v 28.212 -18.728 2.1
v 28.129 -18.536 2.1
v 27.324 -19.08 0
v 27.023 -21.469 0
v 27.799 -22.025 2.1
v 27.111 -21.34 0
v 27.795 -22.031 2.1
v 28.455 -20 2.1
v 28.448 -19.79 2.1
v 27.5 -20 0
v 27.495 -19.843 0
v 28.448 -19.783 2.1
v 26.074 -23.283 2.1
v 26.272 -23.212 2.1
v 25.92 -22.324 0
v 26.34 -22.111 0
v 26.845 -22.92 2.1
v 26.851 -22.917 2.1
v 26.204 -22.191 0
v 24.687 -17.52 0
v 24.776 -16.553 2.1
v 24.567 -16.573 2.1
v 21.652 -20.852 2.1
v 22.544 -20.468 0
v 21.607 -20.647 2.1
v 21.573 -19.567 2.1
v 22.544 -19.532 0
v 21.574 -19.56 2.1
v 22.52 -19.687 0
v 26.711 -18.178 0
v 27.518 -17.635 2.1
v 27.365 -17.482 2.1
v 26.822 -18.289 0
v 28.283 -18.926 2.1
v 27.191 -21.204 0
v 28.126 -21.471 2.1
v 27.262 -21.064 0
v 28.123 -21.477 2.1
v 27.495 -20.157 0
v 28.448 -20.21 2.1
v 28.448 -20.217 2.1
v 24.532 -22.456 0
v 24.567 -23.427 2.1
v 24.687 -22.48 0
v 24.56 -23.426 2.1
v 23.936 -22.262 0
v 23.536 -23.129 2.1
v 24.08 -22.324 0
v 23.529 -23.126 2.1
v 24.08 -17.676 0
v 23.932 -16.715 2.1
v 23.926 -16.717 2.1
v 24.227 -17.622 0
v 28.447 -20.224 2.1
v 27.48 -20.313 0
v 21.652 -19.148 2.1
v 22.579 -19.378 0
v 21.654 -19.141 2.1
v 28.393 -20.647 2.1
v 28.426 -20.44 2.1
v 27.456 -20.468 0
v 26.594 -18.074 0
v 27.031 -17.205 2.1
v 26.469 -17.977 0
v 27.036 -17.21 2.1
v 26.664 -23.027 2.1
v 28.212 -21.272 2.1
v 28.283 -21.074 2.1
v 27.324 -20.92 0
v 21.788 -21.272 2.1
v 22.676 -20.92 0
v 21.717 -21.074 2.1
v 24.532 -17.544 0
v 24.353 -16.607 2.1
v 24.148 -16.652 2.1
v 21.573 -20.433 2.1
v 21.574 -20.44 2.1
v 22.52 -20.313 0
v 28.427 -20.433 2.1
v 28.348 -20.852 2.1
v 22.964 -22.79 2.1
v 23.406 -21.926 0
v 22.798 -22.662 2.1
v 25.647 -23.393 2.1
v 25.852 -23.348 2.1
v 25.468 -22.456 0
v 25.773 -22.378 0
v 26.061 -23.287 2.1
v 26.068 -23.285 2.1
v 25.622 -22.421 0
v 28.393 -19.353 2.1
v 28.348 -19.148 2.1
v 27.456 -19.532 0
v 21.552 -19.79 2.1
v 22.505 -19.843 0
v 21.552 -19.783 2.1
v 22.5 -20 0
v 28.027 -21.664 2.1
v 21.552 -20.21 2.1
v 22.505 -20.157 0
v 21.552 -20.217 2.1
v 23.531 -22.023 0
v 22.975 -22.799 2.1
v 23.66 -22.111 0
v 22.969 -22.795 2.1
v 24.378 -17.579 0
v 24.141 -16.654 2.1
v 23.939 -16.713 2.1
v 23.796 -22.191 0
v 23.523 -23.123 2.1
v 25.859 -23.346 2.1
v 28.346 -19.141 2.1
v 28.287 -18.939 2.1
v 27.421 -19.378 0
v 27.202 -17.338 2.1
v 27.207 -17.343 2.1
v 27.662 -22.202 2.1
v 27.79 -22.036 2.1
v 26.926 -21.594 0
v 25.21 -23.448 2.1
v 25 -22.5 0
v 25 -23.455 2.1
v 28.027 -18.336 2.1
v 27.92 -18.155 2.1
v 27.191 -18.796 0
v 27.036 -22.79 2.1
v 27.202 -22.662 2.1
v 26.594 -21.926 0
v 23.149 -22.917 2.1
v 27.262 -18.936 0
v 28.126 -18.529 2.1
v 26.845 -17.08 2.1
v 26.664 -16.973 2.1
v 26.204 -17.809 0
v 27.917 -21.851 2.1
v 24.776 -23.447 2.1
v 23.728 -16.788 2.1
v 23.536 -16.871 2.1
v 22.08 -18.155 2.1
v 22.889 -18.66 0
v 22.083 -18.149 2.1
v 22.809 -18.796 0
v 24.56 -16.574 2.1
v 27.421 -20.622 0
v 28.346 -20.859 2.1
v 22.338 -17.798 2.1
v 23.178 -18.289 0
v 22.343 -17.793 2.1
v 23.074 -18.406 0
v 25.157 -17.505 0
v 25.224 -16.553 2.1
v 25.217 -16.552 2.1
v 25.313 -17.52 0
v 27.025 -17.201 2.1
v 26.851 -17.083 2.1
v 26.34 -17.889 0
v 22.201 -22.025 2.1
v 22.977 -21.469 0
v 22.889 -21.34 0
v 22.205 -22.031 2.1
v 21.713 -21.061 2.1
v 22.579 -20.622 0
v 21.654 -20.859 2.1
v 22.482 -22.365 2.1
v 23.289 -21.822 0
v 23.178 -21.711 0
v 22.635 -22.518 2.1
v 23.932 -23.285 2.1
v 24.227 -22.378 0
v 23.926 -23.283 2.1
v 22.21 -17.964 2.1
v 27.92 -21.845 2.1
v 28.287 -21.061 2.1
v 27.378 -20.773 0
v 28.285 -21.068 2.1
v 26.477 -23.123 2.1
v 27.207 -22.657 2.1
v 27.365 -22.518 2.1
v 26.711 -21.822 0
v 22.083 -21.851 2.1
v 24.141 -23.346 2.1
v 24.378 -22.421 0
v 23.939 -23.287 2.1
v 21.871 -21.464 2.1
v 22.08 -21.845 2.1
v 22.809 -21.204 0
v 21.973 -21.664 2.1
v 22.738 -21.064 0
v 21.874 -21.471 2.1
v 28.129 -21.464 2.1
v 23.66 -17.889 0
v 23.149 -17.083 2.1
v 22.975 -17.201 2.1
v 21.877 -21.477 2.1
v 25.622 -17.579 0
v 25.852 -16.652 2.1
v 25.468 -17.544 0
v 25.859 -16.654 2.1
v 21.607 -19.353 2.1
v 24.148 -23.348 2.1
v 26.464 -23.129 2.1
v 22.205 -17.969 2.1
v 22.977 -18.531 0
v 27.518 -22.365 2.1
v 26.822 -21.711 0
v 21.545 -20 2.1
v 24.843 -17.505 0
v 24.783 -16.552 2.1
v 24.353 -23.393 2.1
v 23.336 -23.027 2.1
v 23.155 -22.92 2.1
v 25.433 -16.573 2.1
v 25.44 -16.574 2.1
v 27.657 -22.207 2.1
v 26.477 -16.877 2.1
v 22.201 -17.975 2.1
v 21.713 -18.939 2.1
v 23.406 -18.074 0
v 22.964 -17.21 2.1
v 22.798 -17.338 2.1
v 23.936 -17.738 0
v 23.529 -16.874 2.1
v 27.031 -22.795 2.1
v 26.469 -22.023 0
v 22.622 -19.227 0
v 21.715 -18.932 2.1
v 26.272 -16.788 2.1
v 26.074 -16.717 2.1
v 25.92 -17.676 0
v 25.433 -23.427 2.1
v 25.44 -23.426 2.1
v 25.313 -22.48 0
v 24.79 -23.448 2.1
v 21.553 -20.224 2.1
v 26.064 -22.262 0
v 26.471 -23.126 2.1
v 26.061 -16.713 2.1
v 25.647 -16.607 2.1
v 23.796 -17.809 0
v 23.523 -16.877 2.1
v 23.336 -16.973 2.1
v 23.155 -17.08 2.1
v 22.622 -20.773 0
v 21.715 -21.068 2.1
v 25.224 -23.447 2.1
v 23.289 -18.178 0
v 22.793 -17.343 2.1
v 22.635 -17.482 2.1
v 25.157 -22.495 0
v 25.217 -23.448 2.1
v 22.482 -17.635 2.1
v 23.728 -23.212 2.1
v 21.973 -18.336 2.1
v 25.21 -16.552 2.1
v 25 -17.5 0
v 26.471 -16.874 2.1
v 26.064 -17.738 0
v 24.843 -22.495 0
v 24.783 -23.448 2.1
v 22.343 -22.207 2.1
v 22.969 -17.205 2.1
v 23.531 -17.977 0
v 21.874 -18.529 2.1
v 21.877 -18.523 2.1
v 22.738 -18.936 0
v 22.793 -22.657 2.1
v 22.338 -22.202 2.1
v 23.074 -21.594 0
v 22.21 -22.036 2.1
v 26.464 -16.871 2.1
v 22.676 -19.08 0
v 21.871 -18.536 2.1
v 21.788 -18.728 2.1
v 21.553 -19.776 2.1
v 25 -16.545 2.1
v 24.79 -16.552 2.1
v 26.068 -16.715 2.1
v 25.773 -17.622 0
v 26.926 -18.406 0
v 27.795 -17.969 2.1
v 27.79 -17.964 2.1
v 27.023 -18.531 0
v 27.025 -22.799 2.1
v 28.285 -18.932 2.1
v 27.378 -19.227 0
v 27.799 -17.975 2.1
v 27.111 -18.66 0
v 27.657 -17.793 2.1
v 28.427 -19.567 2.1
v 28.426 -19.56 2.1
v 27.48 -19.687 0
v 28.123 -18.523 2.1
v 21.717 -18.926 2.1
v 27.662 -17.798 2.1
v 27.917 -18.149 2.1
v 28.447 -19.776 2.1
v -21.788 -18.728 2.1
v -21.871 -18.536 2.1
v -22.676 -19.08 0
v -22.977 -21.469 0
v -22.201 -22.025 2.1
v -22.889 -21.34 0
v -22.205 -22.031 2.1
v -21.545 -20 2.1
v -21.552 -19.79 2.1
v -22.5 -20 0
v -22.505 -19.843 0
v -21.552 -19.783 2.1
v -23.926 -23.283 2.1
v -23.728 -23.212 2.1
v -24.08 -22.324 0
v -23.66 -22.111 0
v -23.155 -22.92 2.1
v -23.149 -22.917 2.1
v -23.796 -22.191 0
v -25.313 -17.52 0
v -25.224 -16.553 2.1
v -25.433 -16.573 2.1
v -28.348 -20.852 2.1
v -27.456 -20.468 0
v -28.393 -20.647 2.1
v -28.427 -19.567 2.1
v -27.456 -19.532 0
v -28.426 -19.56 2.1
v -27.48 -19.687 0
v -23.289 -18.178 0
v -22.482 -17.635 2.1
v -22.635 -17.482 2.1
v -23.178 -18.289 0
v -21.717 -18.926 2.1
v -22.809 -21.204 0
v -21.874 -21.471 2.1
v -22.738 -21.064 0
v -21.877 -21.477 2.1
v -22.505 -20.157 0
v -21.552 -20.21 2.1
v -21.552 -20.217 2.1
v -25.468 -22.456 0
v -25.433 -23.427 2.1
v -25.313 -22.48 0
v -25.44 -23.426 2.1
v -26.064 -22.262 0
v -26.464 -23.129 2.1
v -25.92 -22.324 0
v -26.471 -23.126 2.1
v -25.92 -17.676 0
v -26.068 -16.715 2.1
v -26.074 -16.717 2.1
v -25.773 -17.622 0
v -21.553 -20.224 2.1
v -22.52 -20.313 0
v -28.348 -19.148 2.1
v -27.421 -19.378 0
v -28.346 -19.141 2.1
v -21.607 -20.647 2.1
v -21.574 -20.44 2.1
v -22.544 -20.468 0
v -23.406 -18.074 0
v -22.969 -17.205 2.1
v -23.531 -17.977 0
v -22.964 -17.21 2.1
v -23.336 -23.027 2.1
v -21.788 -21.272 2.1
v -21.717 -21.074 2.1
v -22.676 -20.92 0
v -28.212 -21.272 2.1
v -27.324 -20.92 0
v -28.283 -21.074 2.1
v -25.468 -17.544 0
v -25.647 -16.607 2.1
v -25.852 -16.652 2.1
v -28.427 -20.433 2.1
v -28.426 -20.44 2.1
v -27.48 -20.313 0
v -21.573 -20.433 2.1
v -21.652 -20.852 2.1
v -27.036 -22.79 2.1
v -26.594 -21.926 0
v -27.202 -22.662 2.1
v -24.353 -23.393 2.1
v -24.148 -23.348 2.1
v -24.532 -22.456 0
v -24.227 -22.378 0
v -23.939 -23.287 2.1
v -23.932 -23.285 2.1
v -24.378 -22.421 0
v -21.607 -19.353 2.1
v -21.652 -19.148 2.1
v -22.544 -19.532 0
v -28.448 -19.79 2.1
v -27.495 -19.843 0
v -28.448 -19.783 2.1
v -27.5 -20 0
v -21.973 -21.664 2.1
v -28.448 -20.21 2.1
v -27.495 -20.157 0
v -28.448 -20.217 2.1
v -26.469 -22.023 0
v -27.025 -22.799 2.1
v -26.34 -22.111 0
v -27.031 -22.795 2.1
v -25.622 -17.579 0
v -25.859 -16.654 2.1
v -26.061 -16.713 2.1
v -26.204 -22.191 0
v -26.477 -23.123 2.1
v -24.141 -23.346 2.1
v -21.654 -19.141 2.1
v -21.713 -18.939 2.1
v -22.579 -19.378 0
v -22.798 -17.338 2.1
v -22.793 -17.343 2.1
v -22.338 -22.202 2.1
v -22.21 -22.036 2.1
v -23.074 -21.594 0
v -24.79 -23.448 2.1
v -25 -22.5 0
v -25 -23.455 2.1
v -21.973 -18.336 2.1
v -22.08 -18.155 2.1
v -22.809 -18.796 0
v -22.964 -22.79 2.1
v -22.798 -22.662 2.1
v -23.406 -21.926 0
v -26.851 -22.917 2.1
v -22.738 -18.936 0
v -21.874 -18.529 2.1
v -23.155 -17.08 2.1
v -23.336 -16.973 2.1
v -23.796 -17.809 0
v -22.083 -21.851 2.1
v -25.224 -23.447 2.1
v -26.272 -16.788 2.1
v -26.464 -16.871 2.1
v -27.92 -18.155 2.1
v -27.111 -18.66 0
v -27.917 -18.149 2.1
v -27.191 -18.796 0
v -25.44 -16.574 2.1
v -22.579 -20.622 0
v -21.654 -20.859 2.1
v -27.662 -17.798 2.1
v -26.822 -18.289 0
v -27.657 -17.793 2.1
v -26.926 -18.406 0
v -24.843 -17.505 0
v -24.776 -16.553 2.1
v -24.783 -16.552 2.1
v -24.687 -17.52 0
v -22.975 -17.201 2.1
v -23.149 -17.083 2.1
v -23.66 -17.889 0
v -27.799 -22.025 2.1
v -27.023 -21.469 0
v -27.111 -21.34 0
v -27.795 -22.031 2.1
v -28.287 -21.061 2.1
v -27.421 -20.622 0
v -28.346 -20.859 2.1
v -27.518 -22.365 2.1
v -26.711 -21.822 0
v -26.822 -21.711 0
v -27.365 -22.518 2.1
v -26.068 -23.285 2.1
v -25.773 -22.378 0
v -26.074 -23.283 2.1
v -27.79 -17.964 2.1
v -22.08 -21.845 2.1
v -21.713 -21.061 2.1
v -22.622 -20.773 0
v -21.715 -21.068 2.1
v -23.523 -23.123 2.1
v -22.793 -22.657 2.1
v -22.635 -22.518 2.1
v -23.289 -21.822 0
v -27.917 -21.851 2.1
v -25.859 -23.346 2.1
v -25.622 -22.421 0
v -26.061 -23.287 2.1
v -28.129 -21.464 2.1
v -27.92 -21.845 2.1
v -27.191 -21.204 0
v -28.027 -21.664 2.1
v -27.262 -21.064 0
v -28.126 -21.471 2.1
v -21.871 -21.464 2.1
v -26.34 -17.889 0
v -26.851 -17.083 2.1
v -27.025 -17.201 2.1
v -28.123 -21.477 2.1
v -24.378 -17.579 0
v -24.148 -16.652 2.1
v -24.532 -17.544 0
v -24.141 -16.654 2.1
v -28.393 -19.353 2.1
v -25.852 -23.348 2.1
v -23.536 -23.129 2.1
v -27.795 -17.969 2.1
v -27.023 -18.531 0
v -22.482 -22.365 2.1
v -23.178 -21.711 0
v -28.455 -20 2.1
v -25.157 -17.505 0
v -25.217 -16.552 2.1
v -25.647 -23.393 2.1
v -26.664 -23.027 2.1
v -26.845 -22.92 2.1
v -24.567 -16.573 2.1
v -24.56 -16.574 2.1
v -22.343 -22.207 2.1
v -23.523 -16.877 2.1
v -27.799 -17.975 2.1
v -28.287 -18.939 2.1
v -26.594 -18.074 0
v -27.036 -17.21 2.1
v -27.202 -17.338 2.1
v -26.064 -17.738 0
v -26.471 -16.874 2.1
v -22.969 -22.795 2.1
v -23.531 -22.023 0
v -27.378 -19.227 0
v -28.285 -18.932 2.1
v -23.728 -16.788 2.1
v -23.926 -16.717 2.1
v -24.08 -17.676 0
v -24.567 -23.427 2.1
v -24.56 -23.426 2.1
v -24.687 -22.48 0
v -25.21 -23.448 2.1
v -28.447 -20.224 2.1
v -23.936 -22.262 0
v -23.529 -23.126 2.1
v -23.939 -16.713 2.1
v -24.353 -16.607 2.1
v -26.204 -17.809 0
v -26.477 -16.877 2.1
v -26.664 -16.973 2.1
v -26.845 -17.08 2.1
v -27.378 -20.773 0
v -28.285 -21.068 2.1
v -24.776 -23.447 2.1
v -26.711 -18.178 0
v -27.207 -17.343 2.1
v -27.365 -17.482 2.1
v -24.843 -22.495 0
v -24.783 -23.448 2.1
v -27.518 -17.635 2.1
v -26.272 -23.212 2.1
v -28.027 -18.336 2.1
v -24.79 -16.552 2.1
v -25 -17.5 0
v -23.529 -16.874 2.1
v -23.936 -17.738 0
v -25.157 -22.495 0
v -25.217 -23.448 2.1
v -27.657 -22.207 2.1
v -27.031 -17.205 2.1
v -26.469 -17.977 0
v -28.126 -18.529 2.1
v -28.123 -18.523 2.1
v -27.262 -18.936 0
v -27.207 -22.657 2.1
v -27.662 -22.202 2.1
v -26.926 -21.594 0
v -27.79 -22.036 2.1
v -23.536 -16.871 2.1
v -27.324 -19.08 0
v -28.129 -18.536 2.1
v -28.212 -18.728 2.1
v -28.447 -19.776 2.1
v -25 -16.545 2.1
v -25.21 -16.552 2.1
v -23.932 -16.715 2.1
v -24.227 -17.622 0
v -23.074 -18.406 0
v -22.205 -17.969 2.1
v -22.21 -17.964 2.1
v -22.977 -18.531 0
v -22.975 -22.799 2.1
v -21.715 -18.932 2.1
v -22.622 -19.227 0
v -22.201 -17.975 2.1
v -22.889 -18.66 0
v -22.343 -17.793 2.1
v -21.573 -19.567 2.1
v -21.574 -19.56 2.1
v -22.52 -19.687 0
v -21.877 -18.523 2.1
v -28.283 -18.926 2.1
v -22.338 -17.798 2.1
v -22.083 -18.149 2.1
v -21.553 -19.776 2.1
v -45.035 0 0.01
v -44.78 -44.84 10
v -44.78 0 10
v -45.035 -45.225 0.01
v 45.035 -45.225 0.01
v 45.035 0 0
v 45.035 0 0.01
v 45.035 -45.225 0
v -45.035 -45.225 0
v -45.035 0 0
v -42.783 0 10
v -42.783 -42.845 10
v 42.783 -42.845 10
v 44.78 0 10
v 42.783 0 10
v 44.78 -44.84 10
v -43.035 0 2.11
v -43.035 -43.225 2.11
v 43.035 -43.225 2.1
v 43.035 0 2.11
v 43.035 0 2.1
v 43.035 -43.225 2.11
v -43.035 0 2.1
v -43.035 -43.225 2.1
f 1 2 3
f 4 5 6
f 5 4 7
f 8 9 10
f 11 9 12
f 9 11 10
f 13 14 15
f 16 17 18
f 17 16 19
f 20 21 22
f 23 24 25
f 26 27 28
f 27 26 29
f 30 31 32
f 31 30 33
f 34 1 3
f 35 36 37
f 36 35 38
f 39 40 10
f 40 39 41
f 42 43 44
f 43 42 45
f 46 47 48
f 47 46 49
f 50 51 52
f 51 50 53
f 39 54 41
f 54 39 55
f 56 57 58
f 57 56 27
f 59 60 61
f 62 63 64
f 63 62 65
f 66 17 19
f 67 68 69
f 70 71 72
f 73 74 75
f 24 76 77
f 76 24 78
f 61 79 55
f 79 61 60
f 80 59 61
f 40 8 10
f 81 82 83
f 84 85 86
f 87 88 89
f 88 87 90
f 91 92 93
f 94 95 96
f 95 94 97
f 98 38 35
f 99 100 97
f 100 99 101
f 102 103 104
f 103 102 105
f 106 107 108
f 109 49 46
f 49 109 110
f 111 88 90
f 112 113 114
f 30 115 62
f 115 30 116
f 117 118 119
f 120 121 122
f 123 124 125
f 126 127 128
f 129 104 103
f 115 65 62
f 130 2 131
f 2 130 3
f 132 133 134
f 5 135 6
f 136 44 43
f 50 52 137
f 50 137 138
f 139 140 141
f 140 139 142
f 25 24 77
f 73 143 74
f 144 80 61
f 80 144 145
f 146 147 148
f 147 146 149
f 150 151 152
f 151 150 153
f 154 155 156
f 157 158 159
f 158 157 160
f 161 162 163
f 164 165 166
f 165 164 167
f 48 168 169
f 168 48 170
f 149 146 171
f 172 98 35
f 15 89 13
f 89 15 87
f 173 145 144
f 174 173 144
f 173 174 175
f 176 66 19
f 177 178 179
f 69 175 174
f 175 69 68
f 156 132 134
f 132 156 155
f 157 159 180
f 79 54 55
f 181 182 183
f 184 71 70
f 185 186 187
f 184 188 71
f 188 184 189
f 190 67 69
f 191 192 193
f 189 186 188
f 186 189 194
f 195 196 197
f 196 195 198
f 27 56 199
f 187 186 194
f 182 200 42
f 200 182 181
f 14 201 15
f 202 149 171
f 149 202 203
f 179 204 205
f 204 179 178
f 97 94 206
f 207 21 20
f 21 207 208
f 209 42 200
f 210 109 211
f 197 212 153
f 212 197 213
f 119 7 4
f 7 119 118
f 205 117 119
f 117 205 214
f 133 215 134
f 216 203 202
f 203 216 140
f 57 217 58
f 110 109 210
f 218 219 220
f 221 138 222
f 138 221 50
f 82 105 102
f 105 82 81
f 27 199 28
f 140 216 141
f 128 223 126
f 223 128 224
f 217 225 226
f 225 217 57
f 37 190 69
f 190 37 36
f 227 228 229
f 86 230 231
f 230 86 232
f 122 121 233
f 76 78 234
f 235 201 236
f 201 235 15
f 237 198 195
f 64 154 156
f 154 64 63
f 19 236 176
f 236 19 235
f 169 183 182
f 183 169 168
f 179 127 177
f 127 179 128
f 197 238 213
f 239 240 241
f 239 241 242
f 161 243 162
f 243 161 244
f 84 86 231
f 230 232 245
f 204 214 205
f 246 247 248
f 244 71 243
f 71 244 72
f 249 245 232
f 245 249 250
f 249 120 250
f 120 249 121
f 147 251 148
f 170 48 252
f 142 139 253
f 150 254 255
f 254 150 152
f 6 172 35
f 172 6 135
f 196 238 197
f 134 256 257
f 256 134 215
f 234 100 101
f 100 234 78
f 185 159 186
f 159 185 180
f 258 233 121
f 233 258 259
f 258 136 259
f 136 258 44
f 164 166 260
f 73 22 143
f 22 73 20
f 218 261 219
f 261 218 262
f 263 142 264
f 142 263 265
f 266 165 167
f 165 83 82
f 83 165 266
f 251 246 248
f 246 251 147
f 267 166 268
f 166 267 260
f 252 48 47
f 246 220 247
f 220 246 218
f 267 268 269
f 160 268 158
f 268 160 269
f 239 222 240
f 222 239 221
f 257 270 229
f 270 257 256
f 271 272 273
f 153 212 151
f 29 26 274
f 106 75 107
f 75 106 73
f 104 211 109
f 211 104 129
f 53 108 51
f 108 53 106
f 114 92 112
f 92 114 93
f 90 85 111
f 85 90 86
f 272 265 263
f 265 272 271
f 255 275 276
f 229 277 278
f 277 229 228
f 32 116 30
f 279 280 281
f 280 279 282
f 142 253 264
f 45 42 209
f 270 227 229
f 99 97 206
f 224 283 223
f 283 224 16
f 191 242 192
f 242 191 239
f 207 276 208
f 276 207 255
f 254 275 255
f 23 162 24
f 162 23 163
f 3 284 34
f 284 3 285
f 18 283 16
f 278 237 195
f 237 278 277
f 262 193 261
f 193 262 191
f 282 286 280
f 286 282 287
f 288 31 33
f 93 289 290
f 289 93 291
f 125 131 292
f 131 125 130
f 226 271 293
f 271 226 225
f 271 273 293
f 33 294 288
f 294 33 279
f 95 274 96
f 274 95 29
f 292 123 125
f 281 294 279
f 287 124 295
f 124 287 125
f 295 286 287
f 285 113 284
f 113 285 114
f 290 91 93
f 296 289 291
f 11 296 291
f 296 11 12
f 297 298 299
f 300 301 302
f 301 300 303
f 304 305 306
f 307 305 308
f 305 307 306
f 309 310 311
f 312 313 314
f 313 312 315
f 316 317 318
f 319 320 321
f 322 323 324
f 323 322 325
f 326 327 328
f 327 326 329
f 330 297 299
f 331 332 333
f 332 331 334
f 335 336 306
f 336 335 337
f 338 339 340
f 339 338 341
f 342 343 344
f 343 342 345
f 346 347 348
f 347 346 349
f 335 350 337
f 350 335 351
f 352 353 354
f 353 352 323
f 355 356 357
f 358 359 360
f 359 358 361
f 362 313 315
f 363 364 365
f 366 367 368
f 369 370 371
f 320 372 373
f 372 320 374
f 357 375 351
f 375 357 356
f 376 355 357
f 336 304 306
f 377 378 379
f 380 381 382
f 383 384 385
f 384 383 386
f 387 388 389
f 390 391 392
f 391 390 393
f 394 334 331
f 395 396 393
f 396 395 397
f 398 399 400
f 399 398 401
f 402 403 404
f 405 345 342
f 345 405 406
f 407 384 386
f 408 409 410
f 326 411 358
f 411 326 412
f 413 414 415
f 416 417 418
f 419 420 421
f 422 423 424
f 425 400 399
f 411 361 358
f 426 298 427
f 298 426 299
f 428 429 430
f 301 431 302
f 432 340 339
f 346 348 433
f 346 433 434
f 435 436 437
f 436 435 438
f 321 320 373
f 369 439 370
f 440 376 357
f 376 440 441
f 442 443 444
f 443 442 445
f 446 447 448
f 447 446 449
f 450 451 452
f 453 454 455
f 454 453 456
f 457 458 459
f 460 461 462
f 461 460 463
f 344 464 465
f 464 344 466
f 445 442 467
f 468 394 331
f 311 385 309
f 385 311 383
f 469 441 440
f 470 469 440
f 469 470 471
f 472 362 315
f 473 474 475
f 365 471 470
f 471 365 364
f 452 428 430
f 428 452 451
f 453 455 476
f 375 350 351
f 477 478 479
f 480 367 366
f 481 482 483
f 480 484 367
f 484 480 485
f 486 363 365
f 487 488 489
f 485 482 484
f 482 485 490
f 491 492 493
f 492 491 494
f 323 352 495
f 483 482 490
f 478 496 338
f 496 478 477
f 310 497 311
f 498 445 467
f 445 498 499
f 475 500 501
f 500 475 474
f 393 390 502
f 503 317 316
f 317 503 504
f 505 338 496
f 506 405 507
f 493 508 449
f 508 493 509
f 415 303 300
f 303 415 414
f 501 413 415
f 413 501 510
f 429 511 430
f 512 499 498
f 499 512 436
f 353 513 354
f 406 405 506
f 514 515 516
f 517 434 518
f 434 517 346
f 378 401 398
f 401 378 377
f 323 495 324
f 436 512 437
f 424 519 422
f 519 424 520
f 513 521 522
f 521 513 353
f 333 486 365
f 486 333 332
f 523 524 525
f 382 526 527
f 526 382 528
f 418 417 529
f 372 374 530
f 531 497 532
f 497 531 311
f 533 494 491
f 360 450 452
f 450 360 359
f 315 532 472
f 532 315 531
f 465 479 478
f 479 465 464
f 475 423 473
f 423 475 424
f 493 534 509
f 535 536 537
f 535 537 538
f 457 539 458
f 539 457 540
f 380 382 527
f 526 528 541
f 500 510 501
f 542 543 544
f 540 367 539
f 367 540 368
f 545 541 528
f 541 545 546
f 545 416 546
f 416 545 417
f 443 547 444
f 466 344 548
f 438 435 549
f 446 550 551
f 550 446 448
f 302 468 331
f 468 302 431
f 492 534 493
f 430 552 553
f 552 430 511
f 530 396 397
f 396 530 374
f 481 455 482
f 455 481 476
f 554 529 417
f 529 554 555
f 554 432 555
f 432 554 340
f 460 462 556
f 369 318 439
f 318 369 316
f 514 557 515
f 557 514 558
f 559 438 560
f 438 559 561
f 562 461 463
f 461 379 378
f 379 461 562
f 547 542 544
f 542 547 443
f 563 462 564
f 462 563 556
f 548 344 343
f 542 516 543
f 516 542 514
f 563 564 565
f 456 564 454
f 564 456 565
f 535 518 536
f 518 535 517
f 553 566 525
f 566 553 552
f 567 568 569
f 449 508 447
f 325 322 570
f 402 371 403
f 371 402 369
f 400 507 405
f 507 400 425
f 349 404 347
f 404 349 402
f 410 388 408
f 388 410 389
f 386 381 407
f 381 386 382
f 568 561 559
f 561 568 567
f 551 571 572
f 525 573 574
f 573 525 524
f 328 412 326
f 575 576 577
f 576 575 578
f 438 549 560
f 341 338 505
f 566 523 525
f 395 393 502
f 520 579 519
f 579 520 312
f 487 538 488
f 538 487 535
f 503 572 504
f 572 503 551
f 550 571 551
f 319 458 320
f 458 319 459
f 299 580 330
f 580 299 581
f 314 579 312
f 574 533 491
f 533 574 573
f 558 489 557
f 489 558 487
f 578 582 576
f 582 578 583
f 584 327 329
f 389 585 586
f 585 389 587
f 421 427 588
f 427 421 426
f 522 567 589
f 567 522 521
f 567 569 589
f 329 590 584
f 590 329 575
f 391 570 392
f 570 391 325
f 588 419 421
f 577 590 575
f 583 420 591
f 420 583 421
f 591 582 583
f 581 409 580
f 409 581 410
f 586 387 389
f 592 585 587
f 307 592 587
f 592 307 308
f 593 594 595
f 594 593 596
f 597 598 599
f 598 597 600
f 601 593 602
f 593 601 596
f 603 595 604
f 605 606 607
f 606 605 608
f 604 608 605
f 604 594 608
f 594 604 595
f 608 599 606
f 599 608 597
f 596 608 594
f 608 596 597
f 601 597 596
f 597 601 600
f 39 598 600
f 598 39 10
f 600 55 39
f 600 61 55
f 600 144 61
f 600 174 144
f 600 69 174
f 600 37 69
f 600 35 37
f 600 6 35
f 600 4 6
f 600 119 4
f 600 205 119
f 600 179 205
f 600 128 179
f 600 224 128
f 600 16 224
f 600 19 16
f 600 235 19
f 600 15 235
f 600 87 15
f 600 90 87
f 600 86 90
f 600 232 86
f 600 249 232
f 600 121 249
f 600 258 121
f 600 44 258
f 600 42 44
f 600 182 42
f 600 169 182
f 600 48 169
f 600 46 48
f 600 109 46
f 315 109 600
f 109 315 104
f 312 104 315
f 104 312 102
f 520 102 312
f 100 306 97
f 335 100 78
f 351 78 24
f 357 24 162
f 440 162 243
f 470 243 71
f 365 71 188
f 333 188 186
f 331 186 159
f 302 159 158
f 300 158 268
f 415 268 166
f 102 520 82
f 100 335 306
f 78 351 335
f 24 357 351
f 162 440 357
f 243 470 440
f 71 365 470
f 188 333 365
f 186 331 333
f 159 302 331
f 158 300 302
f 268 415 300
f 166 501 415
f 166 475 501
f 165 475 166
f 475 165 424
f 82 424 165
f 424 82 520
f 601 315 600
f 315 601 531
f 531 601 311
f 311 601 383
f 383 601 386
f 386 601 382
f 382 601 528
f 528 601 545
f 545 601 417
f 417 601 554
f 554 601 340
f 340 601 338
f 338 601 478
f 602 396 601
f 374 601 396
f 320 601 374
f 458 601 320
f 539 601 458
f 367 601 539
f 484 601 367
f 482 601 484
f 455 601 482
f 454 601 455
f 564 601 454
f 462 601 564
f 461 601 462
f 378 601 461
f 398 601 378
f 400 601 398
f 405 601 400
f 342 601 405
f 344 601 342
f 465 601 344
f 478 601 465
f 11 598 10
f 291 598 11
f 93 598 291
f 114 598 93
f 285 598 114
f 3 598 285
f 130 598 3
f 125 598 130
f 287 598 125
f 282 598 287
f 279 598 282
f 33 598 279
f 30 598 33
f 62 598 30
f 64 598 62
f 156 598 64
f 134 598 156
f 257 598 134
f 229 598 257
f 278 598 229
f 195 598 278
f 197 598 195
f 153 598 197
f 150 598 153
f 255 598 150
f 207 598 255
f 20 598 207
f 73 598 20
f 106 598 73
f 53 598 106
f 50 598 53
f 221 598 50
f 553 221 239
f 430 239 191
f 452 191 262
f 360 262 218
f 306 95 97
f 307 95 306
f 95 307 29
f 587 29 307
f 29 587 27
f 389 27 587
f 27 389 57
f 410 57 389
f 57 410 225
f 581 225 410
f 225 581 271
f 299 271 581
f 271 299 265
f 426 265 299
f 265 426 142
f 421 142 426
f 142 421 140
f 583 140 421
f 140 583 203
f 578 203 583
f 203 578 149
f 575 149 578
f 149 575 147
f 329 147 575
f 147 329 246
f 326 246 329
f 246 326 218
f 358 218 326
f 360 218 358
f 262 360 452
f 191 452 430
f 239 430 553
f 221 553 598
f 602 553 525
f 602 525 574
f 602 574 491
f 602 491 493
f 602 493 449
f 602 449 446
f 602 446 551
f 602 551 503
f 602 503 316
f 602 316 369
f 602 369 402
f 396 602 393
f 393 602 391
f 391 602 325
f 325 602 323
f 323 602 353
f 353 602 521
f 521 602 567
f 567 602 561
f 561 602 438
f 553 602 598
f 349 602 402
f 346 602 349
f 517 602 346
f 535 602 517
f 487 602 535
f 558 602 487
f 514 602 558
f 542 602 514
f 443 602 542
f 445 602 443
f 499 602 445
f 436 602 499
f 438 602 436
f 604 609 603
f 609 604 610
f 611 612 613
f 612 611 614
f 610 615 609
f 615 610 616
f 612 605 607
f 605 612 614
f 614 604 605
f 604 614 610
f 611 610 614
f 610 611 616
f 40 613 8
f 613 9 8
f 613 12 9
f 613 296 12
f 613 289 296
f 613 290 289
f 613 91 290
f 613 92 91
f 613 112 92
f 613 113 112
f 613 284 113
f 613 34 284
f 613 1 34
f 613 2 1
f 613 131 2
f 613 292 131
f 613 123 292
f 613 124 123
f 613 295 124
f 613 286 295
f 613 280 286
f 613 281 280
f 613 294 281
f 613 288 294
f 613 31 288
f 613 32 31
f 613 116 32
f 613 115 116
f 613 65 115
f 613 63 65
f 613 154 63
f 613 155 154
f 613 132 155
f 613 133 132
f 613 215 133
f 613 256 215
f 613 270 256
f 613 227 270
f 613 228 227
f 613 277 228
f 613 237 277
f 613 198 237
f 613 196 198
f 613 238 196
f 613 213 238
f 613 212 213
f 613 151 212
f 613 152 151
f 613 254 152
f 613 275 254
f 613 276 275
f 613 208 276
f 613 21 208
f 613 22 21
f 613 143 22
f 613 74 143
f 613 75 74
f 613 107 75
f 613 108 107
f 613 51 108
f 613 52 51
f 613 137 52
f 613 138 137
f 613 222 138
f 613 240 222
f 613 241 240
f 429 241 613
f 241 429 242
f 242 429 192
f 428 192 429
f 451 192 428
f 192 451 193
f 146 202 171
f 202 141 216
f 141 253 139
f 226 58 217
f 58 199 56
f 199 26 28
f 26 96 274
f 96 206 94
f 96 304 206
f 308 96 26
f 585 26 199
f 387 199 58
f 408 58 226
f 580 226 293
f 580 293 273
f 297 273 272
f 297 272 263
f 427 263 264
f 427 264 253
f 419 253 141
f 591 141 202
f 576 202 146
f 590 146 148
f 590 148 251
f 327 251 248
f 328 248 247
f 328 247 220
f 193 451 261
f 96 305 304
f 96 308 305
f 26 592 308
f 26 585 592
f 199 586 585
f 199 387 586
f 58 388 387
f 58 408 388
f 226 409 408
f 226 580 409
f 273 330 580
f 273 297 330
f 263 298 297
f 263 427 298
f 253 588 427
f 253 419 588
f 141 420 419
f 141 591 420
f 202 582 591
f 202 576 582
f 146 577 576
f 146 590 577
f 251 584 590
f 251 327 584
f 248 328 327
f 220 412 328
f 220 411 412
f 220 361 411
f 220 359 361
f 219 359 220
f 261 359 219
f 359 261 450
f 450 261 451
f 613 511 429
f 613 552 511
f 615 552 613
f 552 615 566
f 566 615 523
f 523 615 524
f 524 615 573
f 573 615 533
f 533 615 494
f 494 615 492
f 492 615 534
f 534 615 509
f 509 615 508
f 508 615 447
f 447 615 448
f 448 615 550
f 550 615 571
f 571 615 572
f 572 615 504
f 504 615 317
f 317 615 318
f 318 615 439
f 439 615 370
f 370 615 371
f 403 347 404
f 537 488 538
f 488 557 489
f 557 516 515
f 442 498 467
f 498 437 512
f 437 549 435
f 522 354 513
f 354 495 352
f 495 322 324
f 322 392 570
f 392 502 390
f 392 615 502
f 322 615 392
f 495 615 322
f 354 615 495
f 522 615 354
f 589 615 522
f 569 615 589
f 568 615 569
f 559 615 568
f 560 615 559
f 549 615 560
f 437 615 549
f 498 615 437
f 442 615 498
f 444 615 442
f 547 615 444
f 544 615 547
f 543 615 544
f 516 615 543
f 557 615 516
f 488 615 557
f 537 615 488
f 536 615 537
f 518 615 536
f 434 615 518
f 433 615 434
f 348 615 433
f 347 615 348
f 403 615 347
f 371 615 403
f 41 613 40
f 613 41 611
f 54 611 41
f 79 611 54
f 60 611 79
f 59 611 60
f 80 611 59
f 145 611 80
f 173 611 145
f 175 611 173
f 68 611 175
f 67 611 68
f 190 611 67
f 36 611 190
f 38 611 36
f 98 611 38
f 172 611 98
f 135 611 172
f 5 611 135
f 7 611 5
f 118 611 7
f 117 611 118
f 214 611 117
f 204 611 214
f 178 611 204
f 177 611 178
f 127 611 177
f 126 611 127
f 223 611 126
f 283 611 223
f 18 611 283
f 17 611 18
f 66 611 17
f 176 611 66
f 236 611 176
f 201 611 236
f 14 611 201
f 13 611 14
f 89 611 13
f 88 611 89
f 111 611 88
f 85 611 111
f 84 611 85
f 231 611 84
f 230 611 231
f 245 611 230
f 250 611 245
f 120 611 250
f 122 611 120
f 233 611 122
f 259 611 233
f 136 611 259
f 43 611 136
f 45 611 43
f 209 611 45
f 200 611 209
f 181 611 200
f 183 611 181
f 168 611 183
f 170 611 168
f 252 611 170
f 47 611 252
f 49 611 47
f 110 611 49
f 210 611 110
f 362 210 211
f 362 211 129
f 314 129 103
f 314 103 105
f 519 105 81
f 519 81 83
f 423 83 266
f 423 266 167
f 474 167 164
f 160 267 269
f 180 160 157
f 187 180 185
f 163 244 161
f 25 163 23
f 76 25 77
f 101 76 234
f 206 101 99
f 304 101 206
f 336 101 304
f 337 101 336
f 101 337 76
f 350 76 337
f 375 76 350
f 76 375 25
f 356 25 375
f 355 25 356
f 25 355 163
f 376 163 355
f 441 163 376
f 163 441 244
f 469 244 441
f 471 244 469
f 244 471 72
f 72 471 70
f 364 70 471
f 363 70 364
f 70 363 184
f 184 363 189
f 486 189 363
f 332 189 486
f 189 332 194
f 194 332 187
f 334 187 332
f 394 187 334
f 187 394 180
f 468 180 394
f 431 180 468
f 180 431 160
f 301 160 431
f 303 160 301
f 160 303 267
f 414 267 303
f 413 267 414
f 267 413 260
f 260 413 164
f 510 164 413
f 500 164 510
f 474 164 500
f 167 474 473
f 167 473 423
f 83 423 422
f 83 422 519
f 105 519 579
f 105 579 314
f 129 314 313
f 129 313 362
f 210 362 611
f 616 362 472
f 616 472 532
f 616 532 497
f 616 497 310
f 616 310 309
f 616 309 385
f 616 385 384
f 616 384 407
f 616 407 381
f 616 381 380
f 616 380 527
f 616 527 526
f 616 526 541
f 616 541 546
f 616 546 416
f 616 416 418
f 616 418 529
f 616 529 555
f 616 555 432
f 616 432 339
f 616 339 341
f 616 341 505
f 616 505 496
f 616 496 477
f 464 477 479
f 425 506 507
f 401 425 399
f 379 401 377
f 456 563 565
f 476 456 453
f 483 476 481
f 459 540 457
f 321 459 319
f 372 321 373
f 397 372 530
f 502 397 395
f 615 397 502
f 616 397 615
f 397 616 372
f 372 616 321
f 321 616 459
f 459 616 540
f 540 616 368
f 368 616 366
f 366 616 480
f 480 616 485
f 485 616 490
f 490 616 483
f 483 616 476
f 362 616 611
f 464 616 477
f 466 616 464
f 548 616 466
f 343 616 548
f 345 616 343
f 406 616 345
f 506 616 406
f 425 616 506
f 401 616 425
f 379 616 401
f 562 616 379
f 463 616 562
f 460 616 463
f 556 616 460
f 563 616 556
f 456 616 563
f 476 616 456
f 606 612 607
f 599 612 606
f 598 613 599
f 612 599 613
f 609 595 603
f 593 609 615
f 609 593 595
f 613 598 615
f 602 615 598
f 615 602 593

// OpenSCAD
// Matthew Sparks
// 2018-08-14
//
// units in 1mm
// Bracket with screw hole for mounting Xiaomi Aquara dual switch

switchWidth = 86.07; // measured at widest point
//sensorHeight = 9.8;
switchHeight = 86.45; // measured at widest point
switchThickness = 8;

switchFrontWidth = 85.56;
switchFrontHeight = 85.68;

widthTolerance = 0.5;
heightTolerance = 0.5;

bracketThickness = 4;
rearThickness = 2;

frontHoleSize = 30;

holeWidth = 8;
holeRoundness = 5;

//fastenerType = "NONE";
fastenerType = "SCREW";
//fastenerType = "NAIL";

screwDistance = 50;
screwOffset =-20;
screwAngle = 90;
nailHeadSize = 7.5;
shaftSize = 5;

$fn = 100;

difference(){
    
    // frame
    hull(){
        translate([0,0,(switchThickness+rearThickness)/2]){
            cube([switchFrontWidth+bracketThickness,switchFrontHeight+bracketThickness,switchThickness+rearThickness],true);
        }
        translate([0,0,(0.01)/2]){
            cube([switchWidth+bracketThickness,switchHeight+bracketThickness,0.01],true);
        }
    }
    
    // cutout of switch
    translate([0,0,rearThickness+0.1]){
        hull(){
            translate([0,0,((switchThickness)/2)]){
                cube([switchFrontWidth,switchFrontHeight,switchThickness],true);
            }
            translate([0,0,(0.01)/2]){
                cube([switchWidth,switchHeight,0.01],true);
            }
        }
    }
    
    // cut off top
    translate([0,0,rearThickness+0.1]){
        translate([0,switchHeight,((switchThickness)/2)]){
            cube([switchWidth*2,switchHeight*2,switchThickness*2],true);
        }
    }
    
    translate([screwDistance/2,screwOffset,0]){
        if(fastenerType=="SCREW") {
            // screw hole
            union(){
                //main hole
                translate([0,0,-0.1]){
                    cylinder(rearThickness+0.2,d=shaftSize,false);
                }
                //countersink
                cylinder(rearThickness+0.2,d1=shaftSize,d2=shaftSize+(rearThickness*tan(screwAngle/2)),false);        
            }
        }
        else if(fastenerType=="NAIL"){        
            union(){
                //main hole
                translate([0,0,-0.1]){
                    cylinder(rearThickness+0.2,d=shaftSize,false);
                }
                //countersink
                translate([0,0,rearThickness/2]){
                    cylinder(rearThickness/2+0.2,d=nailHeadSize,false);
                }
            }
        }
    }
    translate([-screwDistance/2,screwOffset,0]){
        if(fastenerType=="SCREW") {
            // screw hole
            union(){
                //main hole
                translate([0,0,-0.1]){
                    cylinder(rearThickness+0.2,d=shaftSize,false);
                }
                //countersink
                cylinder(rearThickness+0.2,d1=shaftSize,d2=shaftSize+(rearThickness*tan(screwAngle/2)),false);        
            }
        }
        else if(fastenerType=="NAIL"){        
            union(){
                //main hole
                translate([0,0,-0.1]){
                    cylinder(rearThickness+0.2,d=shaftSize,false);
                }
                //countersink
                translate([0,0,rearThickness/2]){
                    cylinder(rearThickness/2+0.2,d=nailHeadSize,false);
                }
            }
        }
    }
    
    
}

    
